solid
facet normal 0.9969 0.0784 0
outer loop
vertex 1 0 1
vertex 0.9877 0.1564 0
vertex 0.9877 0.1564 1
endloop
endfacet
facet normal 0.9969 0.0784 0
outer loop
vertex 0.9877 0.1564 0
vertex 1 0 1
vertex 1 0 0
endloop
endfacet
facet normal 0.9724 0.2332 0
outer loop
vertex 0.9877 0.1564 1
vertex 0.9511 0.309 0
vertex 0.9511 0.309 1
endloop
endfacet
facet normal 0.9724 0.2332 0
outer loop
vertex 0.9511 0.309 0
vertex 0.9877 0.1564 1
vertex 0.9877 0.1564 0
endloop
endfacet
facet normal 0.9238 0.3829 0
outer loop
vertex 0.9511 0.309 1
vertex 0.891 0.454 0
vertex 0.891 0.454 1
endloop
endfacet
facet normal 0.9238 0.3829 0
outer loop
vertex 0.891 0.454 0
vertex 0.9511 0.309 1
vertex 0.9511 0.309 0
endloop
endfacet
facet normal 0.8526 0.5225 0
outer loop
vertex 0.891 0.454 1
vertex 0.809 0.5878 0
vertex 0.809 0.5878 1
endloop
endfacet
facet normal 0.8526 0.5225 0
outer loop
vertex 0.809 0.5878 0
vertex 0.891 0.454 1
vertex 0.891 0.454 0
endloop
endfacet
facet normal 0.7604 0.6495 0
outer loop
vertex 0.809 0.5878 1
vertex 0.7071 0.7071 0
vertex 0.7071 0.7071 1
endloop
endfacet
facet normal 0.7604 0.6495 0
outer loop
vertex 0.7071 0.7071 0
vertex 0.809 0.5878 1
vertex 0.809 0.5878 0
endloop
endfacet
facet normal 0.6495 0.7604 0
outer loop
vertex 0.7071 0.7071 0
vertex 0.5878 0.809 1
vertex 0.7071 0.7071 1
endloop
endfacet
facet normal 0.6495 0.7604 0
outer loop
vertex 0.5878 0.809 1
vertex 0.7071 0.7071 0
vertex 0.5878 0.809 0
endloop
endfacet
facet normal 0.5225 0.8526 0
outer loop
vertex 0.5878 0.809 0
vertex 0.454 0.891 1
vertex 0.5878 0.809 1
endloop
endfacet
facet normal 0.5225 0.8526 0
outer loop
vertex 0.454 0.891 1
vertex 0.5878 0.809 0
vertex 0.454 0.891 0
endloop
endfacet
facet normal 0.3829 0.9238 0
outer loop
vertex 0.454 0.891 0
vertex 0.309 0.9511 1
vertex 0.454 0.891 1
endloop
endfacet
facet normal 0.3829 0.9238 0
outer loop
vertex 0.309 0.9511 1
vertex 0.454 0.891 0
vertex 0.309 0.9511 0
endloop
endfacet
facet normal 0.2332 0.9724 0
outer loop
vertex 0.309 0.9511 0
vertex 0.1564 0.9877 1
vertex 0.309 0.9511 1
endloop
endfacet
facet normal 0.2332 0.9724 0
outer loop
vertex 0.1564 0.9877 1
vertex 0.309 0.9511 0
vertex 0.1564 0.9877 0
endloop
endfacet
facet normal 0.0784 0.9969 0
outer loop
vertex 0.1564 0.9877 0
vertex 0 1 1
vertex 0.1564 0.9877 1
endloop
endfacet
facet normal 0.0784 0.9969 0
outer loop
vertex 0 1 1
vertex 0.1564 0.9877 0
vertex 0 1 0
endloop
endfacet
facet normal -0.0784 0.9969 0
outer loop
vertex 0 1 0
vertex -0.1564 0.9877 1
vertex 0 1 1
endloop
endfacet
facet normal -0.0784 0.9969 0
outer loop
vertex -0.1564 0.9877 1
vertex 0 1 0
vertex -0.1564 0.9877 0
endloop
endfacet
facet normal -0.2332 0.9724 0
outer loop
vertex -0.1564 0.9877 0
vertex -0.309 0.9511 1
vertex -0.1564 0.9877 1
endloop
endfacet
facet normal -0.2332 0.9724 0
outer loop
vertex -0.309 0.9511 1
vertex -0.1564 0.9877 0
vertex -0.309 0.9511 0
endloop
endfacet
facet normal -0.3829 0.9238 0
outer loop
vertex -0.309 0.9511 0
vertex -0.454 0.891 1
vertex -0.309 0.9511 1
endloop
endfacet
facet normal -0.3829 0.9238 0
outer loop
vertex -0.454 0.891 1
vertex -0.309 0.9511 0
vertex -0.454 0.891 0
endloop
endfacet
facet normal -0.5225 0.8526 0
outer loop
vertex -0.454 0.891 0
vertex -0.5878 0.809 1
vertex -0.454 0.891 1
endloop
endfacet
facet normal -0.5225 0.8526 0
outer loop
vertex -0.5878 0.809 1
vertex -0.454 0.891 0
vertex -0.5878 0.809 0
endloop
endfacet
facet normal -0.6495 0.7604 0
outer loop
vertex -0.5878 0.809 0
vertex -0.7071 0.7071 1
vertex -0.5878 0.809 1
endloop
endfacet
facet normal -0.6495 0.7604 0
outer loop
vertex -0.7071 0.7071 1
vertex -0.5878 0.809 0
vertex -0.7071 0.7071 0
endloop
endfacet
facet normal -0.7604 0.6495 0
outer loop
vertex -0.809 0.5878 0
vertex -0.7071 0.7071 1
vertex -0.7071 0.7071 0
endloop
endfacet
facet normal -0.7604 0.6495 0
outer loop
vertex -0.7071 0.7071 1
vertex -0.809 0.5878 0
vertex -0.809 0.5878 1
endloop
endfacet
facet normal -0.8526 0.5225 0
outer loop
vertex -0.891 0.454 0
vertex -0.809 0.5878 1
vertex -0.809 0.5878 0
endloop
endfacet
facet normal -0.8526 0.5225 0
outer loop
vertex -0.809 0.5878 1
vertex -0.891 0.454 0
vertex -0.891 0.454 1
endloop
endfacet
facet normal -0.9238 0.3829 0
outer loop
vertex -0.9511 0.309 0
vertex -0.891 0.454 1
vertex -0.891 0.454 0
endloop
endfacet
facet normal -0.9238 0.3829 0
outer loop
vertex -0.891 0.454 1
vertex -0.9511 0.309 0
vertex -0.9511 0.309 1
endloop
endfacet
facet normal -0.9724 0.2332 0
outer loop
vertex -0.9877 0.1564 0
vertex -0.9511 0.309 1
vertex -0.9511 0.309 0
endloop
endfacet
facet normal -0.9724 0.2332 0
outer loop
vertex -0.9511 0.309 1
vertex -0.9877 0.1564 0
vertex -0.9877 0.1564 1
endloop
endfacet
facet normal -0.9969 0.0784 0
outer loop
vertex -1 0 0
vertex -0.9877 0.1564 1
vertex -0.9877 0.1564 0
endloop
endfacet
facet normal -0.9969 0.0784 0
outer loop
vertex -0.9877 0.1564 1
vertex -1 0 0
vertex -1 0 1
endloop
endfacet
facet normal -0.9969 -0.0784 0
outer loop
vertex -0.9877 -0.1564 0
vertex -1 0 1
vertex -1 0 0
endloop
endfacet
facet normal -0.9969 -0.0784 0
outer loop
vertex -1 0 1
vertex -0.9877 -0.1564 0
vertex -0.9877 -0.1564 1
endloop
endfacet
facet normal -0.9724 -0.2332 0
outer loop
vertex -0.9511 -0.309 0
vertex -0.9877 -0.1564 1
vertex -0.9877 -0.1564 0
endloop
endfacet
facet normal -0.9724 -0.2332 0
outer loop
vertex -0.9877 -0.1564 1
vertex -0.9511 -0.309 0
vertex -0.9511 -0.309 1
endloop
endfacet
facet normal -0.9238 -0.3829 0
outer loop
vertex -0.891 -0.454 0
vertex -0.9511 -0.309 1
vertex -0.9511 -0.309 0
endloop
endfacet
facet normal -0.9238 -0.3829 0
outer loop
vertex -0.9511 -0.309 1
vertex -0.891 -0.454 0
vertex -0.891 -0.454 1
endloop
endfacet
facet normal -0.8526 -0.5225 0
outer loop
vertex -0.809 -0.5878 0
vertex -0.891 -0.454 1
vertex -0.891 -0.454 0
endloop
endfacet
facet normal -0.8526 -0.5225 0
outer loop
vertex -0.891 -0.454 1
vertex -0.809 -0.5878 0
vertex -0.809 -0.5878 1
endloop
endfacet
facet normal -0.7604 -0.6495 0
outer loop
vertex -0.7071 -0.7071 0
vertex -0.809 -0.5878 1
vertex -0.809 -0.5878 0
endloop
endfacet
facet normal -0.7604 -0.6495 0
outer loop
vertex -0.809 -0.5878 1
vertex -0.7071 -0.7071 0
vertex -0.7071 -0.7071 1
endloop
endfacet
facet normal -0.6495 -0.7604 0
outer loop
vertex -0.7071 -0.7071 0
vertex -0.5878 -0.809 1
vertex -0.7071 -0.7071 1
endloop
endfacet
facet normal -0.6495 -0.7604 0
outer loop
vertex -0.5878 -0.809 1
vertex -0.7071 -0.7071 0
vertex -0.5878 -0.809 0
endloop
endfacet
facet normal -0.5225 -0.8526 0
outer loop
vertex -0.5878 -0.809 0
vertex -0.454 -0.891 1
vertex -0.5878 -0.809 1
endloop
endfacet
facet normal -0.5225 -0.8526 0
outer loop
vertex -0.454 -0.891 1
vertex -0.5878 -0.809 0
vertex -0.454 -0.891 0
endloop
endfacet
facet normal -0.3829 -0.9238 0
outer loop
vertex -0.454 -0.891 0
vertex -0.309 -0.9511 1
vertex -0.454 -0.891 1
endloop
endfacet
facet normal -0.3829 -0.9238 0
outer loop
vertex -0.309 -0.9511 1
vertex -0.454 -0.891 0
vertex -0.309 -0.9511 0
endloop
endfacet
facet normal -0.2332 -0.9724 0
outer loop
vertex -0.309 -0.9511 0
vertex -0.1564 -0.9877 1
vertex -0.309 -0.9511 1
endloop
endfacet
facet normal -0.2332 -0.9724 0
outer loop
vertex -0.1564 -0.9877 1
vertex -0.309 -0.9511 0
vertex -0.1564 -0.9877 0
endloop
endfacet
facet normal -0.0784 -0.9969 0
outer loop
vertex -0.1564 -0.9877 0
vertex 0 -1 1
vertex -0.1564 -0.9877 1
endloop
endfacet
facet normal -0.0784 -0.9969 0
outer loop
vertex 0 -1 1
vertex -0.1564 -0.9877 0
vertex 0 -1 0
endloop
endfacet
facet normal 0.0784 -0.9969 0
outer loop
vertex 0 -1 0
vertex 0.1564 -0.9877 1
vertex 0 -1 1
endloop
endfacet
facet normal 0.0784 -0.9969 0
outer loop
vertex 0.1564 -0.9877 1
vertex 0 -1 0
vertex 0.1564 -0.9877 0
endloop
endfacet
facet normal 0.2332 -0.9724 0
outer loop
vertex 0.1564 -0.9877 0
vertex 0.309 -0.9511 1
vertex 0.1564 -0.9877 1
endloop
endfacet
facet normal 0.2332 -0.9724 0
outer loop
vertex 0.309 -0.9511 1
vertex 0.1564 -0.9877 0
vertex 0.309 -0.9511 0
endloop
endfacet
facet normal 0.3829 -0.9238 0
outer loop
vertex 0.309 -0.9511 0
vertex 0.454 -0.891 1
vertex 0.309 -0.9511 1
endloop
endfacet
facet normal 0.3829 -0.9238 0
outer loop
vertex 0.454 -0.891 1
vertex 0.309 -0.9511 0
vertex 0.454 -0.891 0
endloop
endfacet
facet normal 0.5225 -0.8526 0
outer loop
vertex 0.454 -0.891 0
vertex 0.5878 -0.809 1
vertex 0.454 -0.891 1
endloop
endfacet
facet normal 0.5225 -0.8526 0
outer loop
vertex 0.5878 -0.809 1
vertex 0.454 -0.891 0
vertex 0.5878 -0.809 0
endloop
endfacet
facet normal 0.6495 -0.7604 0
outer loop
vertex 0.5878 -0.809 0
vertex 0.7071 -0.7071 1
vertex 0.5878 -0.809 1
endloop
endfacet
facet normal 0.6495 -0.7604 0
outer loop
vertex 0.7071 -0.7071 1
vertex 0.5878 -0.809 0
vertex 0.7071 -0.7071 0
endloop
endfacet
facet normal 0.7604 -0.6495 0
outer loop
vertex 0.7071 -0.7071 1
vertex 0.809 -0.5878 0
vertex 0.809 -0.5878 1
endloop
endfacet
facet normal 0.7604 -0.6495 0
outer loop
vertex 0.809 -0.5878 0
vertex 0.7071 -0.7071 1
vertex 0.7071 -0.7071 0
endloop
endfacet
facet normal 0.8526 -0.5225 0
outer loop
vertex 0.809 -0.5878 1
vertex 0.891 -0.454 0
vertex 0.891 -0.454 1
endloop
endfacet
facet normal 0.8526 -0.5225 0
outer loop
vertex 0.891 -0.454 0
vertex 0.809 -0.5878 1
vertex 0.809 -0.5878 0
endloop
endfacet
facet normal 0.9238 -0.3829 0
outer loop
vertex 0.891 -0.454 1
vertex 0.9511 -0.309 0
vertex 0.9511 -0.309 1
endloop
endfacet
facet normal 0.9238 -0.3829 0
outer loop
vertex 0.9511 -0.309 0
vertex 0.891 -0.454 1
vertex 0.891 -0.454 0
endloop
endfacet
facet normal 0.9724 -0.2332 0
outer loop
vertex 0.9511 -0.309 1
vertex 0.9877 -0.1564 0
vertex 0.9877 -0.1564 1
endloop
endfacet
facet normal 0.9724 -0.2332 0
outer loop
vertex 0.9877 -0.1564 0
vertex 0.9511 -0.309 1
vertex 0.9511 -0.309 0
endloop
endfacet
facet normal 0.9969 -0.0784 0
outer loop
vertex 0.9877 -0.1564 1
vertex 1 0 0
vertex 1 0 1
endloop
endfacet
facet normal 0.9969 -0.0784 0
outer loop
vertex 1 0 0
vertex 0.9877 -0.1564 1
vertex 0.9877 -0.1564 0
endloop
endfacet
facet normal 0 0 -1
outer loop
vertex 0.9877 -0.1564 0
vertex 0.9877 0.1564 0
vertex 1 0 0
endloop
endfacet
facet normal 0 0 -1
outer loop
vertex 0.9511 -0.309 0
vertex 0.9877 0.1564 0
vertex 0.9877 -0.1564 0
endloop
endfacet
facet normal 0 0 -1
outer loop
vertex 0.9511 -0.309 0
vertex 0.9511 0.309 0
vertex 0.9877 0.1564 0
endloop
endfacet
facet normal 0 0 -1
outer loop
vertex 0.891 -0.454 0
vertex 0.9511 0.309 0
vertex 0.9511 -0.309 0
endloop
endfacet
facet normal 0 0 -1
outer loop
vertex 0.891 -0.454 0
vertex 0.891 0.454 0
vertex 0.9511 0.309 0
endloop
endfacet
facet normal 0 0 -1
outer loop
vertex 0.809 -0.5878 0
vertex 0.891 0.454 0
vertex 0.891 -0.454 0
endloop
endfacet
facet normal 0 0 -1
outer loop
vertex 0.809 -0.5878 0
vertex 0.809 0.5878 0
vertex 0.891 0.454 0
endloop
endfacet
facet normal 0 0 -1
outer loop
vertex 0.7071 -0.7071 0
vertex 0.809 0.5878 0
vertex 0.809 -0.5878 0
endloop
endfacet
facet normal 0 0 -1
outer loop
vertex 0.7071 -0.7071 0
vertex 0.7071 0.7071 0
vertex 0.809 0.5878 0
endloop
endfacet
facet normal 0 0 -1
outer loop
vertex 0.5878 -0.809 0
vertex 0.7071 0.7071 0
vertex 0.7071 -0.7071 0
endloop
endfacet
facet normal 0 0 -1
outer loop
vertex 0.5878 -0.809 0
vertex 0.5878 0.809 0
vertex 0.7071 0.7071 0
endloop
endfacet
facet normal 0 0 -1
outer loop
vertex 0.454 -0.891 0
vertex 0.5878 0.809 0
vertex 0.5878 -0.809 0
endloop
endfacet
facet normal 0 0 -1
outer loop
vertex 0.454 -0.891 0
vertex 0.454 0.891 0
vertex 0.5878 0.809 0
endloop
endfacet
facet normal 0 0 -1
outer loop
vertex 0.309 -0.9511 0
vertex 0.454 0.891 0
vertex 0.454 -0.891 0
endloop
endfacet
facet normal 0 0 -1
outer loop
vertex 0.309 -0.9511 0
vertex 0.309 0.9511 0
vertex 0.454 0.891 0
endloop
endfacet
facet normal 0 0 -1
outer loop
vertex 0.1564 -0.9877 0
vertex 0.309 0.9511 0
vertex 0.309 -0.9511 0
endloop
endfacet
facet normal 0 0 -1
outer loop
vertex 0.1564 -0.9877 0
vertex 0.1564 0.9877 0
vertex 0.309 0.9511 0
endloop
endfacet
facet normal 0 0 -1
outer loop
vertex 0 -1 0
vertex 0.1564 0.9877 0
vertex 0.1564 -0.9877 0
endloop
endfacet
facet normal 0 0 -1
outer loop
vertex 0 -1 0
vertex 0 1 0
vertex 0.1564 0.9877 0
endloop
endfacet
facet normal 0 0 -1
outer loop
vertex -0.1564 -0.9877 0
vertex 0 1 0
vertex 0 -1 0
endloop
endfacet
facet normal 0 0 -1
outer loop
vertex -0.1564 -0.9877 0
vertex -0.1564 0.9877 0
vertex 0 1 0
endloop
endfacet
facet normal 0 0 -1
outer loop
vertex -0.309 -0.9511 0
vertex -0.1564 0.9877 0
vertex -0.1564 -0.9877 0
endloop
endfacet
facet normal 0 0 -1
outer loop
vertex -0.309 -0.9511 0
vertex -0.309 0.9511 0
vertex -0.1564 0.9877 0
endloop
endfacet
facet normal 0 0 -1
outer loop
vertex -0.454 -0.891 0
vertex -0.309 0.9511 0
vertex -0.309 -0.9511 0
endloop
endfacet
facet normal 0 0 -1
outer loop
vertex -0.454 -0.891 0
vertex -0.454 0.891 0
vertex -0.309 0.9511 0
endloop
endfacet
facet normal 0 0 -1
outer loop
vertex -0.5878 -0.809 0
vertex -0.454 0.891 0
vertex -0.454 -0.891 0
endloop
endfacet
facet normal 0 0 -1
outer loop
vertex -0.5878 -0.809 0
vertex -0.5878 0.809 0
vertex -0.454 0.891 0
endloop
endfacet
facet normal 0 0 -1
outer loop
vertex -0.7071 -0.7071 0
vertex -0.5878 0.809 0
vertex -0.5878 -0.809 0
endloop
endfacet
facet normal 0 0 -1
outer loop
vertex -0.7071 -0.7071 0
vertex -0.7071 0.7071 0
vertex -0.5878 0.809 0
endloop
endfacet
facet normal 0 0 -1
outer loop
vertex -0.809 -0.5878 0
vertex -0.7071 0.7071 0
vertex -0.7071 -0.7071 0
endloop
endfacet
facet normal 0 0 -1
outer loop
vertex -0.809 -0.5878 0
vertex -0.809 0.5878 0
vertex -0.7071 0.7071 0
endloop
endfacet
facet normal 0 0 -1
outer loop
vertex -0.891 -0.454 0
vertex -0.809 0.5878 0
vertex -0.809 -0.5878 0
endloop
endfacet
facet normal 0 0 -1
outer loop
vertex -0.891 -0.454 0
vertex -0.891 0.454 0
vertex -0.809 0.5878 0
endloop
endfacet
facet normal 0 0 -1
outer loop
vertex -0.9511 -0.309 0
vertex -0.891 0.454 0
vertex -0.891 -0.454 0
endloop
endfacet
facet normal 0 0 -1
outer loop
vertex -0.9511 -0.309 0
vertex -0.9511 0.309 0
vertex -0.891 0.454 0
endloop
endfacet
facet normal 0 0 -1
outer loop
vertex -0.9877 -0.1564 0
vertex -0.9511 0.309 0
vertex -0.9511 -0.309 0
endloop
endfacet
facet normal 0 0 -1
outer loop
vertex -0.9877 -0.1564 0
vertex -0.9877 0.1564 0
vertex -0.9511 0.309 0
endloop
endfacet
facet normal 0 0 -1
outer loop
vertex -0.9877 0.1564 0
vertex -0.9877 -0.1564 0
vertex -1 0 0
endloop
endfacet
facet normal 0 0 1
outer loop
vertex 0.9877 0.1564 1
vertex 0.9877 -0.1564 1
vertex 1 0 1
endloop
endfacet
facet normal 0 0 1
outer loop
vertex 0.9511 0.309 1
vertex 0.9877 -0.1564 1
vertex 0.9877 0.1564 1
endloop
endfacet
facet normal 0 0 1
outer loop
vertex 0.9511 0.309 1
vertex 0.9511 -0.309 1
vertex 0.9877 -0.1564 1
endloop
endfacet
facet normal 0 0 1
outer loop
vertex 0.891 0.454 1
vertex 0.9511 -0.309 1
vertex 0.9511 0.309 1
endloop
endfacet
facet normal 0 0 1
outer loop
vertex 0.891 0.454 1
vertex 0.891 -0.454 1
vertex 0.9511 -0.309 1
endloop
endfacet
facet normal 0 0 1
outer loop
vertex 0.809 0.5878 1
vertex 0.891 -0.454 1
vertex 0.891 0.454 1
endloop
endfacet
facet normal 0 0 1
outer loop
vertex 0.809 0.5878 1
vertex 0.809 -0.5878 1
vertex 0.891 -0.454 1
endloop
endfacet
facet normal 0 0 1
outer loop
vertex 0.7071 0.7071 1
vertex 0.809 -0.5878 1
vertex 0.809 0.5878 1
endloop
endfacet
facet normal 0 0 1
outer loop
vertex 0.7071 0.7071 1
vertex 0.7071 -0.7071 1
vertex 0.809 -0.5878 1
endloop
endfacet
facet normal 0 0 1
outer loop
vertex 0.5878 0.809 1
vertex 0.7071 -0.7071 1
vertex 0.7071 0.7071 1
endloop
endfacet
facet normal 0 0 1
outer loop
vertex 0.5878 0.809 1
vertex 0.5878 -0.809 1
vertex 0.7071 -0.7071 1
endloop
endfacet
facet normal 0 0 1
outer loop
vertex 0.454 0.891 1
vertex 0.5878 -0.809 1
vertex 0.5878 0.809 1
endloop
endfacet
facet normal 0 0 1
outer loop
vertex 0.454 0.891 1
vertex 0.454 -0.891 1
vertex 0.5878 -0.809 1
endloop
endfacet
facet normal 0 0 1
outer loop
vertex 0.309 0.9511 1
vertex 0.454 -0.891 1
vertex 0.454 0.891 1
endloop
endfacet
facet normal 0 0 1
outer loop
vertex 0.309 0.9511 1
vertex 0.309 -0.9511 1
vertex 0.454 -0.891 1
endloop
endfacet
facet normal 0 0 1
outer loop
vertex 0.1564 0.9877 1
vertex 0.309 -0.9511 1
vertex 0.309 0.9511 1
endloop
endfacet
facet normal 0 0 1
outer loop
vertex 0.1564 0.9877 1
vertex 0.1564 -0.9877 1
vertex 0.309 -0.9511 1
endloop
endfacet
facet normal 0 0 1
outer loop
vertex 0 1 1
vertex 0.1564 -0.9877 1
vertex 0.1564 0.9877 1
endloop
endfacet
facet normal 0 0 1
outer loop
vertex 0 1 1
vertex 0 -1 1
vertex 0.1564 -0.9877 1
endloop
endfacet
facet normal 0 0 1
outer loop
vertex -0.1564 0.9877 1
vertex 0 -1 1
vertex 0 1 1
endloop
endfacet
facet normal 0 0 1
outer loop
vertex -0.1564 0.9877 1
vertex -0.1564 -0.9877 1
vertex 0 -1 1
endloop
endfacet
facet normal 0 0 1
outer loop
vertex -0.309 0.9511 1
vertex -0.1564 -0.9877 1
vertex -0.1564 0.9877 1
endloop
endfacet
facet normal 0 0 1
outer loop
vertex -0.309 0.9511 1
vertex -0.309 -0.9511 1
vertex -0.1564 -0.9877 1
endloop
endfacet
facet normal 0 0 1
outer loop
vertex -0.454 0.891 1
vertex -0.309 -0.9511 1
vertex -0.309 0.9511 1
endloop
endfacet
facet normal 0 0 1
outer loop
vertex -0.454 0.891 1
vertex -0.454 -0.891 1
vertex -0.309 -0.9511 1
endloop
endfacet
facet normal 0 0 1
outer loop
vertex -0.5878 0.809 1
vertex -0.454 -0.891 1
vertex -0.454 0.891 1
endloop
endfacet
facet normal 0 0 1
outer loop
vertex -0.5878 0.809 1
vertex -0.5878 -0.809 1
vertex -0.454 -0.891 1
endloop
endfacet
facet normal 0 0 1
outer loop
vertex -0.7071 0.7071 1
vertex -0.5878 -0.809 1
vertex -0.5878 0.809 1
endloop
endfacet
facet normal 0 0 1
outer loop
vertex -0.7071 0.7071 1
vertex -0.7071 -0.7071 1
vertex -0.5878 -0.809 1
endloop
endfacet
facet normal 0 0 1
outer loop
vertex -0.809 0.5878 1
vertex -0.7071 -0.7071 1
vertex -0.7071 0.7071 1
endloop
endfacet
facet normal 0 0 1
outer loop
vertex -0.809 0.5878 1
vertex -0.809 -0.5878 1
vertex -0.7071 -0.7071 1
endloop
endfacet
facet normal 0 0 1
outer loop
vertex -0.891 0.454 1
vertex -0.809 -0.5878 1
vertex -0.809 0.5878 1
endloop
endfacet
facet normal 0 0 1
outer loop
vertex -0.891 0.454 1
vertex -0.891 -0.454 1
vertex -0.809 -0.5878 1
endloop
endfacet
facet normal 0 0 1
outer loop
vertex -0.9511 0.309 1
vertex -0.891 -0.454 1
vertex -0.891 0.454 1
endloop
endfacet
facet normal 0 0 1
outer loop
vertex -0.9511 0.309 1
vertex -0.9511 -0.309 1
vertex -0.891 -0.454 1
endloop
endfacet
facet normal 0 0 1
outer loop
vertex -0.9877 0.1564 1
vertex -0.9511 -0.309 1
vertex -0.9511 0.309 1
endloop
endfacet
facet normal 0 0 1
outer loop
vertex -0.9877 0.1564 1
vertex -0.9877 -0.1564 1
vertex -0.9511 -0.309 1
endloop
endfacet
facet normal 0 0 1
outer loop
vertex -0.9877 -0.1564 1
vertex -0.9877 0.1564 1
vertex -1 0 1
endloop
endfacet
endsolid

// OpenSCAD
// file: testModule.scad
module testObj( RODCOUNT)
{
    for (i = [0:1:RODCOUNT])
        rotate([0,0,i*10])
            translate([0,i,0])
                cylinder(r=1,h=1);
}
// main file
$fn=40;
RODCOUNT=0;

echo(RODCOUNT);
include <testModule.scad>
testObj(RODCOUNT);
